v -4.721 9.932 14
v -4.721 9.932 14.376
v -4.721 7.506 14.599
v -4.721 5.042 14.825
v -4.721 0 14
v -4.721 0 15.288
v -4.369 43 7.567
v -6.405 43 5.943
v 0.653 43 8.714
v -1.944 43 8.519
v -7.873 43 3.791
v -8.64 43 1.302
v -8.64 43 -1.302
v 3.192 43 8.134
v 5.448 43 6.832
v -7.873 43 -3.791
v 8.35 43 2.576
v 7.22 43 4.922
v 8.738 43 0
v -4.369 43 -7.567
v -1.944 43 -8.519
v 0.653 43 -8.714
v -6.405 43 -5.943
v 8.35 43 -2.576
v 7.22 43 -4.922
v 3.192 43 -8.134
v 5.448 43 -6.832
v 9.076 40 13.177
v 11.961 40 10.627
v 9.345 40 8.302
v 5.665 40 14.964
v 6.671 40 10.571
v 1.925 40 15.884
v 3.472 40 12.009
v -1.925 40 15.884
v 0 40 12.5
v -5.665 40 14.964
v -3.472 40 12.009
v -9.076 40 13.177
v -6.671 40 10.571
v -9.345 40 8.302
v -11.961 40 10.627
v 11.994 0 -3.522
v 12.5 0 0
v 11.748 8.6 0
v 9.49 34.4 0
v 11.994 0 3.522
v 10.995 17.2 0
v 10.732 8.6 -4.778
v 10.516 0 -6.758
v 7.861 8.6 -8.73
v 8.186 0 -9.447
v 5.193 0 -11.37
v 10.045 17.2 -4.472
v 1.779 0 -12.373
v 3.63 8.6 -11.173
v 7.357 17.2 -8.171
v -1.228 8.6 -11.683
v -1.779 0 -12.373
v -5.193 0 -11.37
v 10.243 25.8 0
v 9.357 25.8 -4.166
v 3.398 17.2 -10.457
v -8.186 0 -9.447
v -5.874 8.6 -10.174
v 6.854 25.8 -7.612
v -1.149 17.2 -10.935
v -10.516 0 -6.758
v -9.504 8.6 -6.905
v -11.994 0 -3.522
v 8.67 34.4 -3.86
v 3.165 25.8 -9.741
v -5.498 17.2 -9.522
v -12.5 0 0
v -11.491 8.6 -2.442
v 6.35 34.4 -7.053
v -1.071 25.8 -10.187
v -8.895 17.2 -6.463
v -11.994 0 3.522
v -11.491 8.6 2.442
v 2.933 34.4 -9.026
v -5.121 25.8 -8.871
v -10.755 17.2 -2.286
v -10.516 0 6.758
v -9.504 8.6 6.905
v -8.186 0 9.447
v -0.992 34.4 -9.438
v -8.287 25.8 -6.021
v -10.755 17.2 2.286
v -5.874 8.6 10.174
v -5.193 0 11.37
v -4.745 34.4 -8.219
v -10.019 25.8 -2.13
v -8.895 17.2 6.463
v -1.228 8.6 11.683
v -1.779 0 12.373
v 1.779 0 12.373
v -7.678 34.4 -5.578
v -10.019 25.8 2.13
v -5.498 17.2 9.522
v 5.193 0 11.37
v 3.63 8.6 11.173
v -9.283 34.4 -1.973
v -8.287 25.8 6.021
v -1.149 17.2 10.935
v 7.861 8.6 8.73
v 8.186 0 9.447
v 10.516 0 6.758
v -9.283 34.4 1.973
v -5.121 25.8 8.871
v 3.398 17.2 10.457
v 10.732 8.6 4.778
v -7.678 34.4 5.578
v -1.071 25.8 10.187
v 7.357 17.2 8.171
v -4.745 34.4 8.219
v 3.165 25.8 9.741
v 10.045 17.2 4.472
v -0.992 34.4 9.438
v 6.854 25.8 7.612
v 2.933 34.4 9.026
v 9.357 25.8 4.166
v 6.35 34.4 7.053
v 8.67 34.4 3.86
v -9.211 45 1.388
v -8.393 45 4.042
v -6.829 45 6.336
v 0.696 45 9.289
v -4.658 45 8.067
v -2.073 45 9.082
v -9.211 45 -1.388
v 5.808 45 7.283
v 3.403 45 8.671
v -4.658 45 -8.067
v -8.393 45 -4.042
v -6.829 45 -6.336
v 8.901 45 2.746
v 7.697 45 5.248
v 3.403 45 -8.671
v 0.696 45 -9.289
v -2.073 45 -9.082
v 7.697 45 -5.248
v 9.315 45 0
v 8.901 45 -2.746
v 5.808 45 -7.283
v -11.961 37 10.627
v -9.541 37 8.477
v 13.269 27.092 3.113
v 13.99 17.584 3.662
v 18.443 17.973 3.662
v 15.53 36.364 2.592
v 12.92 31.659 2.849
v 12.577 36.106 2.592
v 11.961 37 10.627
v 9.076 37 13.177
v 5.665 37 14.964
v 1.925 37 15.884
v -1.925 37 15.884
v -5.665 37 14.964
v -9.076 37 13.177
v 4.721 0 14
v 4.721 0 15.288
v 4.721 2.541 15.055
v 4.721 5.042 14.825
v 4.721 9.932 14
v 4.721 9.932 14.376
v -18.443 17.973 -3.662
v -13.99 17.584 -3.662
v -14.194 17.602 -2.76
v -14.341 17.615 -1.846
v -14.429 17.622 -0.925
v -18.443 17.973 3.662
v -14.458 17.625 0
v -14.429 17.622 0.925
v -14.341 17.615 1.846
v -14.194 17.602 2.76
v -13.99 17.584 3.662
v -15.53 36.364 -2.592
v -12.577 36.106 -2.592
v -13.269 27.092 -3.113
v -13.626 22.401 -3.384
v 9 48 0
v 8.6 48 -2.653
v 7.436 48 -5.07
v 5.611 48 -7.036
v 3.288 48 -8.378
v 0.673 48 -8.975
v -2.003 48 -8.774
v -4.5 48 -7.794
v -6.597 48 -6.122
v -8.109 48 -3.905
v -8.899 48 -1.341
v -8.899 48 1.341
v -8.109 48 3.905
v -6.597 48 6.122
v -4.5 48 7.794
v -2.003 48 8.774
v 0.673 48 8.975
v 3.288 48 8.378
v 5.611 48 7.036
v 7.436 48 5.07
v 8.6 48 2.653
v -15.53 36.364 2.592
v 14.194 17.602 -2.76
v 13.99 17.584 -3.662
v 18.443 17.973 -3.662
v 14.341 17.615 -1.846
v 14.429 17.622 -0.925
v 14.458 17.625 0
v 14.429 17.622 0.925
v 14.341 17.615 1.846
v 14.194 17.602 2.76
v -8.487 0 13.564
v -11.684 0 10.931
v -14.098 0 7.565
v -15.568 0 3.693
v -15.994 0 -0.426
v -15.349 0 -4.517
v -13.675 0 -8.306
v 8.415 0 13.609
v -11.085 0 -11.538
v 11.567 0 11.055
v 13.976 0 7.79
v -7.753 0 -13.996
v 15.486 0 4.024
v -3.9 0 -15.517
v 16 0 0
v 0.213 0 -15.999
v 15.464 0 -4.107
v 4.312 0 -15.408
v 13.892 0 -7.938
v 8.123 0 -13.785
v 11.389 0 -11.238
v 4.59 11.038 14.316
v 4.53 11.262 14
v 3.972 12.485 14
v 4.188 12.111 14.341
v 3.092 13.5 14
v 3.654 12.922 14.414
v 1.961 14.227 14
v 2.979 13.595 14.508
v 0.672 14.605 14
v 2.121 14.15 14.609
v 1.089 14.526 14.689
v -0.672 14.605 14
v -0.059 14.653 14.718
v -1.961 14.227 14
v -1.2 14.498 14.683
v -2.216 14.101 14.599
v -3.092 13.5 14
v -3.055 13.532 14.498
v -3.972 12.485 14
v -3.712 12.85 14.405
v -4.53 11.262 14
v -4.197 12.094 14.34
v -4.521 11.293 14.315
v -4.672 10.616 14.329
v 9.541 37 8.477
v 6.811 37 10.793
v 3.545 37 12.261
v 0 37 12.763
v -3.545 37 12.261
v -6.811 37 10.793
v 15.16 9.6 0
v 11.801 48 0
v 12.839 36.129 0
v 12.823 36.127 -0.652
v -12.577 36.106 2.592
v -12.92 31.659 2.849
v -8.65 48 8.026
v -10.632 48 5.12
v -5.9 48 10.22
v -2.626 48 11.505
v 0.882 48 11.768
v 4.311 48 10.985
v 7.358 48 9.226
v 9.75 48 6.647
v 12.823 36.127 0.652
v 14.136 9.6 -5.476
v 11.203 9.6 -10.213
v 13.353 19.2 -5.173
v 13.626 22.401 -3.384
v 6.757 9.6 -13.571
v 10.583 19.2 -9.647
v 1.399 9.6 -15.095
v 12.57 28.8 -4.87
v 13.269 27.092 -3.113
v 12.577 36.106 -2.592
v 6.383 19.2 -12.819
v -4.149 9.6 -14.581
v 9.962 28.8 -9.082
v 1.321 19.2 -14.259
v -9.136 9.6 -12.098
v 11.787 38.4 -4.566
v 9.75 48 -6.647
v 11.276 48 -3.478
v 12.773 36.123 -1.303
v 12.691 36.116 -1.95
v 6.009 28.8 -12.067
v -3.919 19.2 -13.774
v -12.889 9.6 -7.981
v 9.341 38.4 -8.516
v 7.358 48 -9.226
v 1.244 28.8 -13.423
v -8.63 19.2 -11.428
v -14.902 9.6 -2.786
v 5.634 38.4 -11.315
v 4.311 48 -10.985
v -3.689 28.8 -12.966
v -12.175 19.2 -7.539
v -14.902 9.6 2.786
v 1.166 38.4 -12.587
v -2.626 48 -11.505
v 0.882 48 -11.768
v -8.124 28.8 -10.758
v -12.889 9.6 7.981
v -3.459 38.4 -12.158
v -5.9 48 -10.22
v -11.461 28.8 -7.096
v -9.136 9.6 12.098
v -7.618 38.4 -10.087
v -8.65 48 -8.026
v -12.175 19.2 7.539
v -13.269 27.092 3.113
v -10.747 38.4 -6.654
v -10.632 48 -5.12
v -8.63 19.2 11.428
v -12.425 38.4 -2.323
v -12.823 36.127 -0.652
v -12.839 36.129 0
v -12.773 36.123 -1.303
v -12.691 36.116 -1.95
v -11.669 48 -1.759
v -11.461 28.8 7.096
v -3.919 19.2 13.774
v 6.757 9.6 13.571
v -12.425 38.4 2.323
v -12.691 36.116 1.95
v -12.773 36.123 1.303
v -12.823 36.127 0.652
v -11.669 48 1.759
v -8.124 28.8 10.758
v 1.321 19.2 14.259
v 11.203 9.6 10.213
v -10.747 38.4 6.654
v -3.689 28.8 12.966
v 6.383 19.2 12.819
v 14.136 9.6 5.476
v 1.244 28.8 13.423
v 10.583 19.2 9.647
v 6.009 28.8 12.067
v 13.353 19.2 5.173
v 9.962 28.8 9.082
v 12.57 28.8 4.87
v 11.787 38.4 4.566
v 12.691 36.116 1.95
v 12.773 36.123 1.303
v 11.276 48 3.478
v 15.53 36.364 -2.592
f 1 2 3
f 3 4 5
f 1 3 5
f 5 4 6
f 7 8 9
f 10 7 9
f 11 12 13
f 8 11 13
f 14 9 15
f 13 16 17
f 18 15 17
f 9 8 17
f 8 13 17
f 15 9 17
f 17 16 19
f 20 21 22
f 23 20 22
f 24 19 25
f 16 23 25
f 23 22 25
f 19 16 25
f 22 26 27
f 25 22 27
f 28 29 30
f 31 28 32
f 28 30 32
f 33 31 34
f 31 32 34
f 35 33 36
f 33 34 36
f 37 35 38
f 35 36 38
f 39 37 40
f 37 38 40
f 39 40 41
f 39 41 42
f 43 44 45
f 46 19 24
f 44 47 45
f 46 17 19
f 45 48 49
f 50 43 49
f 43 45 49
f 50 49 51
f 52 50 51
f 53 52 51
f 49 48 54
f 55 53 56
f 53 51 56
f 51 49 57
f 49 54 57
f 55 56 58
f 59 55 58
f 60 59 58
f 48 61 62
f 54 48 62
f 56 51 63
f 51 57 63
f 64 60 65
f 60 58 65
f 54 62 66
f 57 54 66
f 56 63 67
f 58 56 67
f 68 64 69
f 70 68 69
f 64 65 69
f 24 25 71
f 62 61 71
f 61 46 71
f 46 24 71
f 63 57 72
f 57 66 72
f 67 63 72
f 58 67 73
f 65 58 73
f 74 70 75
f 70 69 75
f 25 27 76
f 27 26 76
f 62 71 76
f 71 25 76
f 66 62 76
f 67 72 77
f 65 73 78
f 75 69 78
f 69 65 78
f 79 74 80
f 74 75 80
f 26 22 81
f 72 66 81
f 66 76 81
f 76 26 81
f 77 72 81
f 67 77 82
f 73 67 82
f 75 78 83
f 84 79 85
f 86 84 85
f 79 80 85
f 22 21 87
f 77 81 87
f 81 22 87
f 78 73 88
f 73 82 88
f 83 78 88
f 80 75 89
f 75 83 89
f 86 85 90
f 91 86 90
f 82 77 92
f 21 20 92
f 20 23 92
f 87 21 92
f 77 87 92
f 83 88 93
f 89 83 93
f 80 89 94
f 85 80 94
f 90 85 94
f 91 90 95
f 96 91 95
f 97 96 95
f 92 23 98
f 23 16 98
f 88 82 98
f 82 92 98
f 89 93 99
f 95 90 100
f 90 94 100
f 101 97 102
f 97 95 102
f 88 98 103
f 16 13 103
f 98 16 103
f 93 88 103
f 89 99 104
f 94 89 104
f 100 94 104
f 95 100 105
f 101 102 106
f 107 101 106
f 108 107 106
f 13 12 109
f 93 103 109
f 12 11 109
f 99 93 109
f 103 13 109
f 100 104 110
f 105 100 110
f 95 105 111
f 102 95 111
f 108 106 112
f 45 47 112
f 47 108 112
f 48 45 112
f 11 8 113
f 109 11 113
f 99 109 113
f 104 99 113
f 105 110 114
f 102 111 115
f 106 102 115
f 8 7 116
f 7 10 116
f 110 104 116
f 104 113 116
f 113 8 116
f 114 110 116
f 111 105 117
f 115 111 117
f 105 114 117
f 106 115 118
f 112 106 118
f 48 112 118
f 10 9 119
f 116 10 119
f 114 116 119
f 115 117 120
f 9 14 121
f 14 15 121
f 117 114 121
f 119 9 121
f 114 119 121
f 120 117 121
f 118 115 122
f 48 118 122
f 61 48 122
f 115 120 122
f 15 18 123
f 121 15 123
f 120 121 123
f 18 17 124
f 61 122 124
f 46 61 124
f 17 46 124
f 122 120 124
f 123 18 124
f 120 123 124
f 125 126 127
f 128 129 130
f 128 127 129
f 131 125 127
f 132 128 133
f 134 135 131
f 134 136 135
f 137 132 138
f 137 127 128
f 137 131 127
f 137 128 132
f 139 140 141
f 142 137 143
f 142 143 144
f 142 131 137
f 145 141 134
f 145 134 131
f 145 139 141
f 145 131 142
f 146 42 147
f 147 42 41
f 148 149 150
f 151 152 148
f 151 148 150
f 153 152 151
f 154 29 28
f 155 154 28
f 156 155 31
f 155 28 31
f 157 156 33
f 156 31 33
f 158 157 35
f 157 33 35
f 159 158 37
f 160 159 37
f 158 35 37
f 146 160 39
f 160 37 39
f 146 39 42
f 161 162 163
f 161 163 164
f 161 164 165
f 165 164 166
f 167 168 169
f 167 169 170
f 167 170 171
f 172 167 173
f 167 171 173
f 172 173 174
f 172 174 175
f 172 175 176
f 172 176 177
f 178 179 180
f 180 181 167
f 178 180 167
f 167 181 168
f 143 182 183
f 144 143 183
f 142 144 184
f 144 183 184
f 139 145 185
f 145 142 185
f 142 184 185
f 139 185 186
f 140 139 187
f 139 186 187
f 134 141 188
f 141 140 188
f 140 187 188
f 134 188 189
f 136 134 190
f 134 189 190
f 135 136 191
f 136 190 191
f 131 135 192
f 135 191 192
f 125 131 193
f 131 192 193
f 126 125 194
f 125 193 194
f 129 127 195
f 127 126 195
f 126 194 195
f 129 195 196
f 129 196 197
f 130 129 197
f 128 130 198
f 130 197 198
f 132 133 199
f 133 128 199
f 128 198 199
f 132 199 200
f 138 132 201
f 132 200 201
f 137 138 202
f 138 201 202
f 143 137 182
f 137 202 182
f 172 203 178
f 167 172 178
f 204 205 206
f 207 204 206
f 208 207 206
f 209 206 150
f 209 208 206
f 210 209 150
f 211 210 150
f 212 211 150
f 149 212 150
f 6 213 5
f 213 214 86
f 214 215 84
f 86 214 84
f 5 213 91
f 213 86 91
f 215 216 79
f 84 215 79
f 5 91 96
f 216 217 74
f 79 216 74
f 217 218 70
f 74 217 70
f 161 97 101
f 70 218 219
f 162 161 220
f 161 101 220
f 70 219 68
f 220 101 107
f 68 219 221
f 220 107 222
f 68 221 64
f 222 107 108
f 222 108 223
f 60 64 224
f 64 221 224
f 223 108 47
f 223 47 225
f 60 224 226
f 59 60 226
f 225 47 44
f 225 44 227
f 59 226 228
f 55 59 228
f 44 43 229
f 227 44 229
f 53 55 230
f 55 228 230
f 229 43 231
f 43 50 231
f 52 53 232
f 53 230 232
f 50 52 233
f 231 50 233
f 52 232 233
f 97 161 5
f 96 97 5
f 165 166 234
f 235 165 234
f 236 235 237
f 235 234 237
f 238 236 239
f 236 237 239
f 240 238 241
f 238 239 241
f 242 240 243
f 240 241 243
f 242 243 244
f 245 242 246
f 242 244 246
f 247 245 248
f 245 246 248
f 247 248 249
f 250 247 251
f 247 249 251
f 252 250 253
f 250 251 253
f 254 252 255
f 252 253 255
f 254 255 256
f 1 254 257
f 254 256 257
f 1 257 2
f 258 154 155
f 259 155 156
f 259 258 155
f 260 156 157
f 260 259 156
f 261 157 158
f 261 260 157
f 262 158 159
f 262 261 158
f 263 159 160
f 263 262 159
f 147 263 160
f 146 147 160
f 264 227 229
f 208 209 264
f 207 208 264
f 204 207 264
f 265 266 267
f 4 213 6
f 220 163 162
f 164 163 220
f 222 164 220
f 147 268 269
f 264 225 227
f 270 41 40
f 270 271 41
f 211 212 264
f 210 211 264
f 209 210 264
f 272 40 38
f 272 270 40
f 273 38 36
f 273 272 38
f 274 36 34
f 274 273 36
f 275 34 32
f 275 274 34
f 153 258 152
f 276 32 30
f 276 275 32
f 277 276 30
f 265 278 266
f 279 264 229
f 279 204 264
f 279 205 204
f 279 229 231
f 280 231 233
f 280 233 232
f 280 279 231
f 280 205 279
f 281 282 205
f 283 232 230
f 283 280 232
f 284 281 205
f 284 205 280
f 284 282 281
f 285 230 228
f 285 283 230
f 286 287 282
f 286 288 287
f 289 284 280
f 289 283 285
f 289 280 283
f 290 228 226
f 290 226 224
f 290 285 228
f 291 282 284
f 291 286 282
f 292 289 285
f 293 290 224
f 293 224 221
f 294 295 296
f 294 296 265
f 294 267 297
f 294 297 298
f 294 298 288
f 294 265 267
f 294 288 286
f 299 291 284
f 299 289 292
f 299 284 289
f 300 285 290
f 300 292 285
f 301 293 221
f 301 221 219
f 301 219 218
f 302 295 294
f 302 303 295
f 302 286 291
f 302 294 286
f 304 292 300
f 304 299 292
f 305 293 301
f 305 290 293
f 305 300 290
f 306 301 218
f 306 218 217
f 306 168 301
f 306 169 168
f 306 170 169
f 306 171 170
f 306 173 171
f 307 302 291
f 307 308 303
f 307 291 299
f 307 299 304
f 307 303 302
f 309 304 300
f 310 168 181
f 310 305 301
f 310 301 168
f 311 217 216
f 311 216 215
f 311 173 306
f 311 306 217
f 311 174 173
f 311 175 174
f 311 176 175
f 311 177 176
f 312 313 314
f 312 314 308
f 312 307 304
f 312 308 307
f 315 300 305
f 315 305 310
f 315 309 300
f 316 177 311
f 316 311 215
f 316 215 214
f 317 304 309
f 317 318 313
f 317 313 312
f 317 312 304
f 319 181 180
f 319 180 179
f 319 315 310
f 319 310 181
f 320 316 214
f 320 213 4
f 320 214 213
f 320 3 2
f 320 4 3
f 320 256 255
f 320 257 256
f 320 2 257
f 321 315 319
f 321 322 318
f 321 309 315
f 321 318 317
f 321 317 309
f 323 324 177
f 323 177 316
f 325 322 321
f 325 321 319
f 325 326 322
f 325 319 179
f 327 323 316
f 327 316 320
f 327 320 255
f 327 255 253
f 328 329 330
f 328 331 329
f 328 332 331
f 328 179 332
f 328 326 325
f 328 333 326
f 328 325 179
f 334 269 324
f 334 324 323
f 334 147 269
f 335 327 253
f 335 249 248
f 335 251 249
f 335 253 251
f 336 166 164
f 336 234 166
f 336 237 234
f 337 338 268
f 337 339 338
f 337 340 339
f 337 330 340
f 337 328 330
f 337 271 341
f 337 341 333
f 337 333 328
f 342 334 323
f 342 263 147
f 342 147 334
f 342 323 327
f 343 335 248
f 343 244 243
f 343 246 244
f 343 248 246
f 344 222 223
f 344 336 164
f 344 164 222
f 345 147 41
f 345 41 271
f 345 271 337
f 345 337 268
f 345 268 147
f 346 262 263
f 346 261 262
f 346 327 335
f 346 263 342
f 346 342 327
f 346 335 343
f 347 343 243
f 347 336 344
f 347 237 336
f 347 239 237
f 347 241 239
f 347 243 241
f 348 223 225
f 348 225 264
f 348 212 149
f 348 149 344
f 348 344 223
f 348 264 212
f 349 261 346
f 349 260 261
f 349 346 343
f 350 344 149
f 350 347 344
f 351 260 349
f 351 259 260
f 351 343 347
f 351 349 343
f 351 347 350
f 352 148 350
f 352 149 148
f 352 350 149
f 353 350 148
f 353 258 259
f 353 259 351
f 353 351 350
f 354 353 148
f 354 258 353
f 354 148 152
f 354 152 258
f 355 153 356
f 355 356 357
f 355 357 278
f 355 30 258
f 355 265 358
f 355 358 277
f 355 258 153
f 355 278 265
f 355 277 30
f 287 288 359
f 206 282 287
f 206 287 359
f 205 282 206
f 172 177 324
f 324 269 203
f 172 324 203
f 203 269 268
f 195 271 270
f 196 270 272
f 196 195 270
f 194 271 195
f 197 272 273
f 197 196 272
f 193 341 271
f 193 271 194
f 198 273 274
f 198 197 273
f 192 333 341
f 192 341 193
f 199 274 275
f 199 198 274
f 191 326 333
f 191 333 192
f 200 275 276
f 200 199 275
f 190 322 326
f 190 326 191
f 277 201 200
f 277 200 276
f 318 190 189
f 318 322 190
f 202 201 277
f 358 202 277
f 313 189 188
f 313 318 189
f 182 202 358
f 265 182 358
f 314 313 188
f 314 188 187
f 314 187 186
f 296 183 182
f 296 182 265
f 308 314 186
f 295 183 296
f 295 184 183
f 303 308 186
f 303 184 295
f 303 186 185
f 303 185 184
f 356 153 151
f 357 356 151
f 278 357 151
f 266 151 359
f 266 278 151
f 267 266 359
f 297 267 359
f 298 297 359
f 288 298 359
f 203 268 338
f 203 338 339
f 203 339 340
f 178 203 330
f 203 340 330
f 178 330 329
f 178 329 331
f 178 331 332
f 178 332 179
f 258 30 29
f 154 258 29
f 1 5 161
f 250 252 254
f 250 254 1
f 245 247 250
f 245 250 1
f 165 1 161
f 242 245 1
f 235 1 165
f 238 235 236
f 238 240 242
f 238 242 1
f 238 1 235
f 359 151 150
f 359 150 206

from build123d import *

# Parameters (mm, degrees)
SKETCH_1_R           = 16
EXTRUDE_1_DEPTH      = 48
EXTRUDE_1_TAPER      = 5
SKETCH_2_R           = 9
CUT_EXTRUDE_1_DEPTH  = 3
CUT_EXTRUDE_1_DRAFT  = 6
CUT_EXTRUDE_2_DEPTH  = 2
SKETCH_6_R           = 12.5
CUT_EXTRUDE_3_DEPTH  = 43
CUT_EXTRUDE_3_TAPER  = 5
EXTRUDE_2_DEPTH      = 3
EXTRUDE_3_DEPTH      = 4
EXTRUDE_3_DEPTH_BACK = 1
CUT_EXTRUDE_5_DEPTH  = 5


with BuildPart() as part:
    # 草图1 → 凸台-拉伸1 (new body)
    with BuildSketch(Plane(origin=(0, 0, 0), x_dir=(1, 0, 0), z_dir=(0, 1, 0))):
        Circle(SKETCH_1_R)
    extrude(amount=EXTRUDE_1_DEPTH, taper=EXTRUDE_1_TAPER)


with BuildPart() as cut_extrude_1_tool:
    # 草图2 → 切除-拉伸1 (with draft: the straight prism first)
    with BuildSketch(Plane(origin=(0, 48, 0), x_dir=(1, 0, 0), z_dir=(0, 1, 0))):
        Circle(SKETCH_2_R)
    extrude(amount=-CUT_EXTRUDE_1_DEPTH)
    # 切除-拉伸1: the draft: its side faces are tilted about the plane it starts from
    cut_extrude_1_sides = [cut_extrude_1_tool.faces().sort_by_distance(p)[0] for p in [
        (-9, 46.5, 0),
    ]]
    draft(cut_extrude_1_sides, Plane(origin=(0, 48, 0), x_dir=(1, 0, 0), z_dir=(0, 1, 0)), CUT_EXTRUDE_1_DRAFT)


with BuildPart() as part_1:
    add(part.part)

    # 切除-拉伸1: cut by cut_extrude_1_tool
    add(cut_extrude_1_tool.part, mode=Mode.SUBTRACT)

    # 草图3 → 切除-拉伸2 (cut)
    with BuildSketch(Plane.XY.offset(16)):
        with BuildLine():
            Line((-4.721374977, 0), (4.721374977, 0))
            Line((4.721374977, 0), (4.721374977, 9.932117857))
            ThreePointArc((4.721374977, 9.932117857), (0, 14.653492833), (-4.721374977, 9.932117857))
            Line((-4.721374977, 9.932117857), (-4.721374977, 0))
        make_face()
    extrude(amount=-CUT_EXTRUDE_2_DEPTH, mode=Mode.SUBTRACT)

    # 草图6 → 切除-拉伸3 (cut)
    with BuildSketch(Plane(origin=(0, 0, 0), x_dir=(1, 0, 0), z_dir=(0, 1, 0))):
        Circle(SKETCH_6_R)
    extrude(amount=CUT_EXTRUDE_3_DEPTH, taper=CUT_EXTRUDE_3_TAPER, mode=Mode.SUBTRACT)

    # 草图8 → 凸台-拉伸2 (add)
    with BuildSketch(Plane(origin=(0, 40, 0), x_dir=(1, 0, 0), z_dir=(0, 1, 0))):
        with BuildLine():
            Line((-11.961452846, -10.626553807), (-9.345224038, -8.302296331))
            ThreePointArc((-9.345224038, -8.302296331), (0, -12.500453459), (9.345224038, -8.302296331))
            Line((9.345224038, -8.302296331), (11.961452846, -10.626553807))
            ThreePointArc((11.961452846, -10.626553807), (0, -16), (-11.961452846, -10.626553807))
        make_face()
    extrude(amount=-EXTRUDE_2_DEPTH)

    # 草图9 → 凸台-拉伸3 (add, two sides: drawn at the far end of the back side and taken through both)
    with BuildSketch(Plane(origin=(15.878462024, 1.389185421, 0), x_dir=(0, 0, -1), z_dir=(0.9961946980917457, 0.0871557427476584, 0)).offset(-EXTRUDE_3_DEPTH_BACK)):
        Polygon((-2.592399587, 34.872205125), (2.592399587, 34.872205125), (3.662079691, 16.297695401), (-3.662079691, 16.297695401), align=None)
    extrude(amount=EXTRUDE_3_DEPTH + EXTRUDE_3_DEPTH_BACK)

    # 草图11 → 切除-拉伸5 (cut)
    with BuildSketch(Plane(origin=(20.768531886, 3.289412299, 0), x_dir=(0, 0, -1), z_dir=(0.9876883405951382, 0.15643446504022776, 0))):
        Polygon((2.592399587, 33.486979454), (-2.592399587, 33.486979454), (-3.662079691, 14.86711267), (3.662079691, 14.86711267), align=None)
    extrude(amount=CUT_EXTRUDE_5_DEPTH, mode=Mode.SUBTRACT)

    # 镜向1: part across plane


with BuildPart() as part_2:
    add(part_1.part)
    add(part_1.part.mirror(Plane(origin=(0, 0, 0), x_dir=(0, 0, 1), z_dir=(1, 0, 0))))


solid = part_2.part
